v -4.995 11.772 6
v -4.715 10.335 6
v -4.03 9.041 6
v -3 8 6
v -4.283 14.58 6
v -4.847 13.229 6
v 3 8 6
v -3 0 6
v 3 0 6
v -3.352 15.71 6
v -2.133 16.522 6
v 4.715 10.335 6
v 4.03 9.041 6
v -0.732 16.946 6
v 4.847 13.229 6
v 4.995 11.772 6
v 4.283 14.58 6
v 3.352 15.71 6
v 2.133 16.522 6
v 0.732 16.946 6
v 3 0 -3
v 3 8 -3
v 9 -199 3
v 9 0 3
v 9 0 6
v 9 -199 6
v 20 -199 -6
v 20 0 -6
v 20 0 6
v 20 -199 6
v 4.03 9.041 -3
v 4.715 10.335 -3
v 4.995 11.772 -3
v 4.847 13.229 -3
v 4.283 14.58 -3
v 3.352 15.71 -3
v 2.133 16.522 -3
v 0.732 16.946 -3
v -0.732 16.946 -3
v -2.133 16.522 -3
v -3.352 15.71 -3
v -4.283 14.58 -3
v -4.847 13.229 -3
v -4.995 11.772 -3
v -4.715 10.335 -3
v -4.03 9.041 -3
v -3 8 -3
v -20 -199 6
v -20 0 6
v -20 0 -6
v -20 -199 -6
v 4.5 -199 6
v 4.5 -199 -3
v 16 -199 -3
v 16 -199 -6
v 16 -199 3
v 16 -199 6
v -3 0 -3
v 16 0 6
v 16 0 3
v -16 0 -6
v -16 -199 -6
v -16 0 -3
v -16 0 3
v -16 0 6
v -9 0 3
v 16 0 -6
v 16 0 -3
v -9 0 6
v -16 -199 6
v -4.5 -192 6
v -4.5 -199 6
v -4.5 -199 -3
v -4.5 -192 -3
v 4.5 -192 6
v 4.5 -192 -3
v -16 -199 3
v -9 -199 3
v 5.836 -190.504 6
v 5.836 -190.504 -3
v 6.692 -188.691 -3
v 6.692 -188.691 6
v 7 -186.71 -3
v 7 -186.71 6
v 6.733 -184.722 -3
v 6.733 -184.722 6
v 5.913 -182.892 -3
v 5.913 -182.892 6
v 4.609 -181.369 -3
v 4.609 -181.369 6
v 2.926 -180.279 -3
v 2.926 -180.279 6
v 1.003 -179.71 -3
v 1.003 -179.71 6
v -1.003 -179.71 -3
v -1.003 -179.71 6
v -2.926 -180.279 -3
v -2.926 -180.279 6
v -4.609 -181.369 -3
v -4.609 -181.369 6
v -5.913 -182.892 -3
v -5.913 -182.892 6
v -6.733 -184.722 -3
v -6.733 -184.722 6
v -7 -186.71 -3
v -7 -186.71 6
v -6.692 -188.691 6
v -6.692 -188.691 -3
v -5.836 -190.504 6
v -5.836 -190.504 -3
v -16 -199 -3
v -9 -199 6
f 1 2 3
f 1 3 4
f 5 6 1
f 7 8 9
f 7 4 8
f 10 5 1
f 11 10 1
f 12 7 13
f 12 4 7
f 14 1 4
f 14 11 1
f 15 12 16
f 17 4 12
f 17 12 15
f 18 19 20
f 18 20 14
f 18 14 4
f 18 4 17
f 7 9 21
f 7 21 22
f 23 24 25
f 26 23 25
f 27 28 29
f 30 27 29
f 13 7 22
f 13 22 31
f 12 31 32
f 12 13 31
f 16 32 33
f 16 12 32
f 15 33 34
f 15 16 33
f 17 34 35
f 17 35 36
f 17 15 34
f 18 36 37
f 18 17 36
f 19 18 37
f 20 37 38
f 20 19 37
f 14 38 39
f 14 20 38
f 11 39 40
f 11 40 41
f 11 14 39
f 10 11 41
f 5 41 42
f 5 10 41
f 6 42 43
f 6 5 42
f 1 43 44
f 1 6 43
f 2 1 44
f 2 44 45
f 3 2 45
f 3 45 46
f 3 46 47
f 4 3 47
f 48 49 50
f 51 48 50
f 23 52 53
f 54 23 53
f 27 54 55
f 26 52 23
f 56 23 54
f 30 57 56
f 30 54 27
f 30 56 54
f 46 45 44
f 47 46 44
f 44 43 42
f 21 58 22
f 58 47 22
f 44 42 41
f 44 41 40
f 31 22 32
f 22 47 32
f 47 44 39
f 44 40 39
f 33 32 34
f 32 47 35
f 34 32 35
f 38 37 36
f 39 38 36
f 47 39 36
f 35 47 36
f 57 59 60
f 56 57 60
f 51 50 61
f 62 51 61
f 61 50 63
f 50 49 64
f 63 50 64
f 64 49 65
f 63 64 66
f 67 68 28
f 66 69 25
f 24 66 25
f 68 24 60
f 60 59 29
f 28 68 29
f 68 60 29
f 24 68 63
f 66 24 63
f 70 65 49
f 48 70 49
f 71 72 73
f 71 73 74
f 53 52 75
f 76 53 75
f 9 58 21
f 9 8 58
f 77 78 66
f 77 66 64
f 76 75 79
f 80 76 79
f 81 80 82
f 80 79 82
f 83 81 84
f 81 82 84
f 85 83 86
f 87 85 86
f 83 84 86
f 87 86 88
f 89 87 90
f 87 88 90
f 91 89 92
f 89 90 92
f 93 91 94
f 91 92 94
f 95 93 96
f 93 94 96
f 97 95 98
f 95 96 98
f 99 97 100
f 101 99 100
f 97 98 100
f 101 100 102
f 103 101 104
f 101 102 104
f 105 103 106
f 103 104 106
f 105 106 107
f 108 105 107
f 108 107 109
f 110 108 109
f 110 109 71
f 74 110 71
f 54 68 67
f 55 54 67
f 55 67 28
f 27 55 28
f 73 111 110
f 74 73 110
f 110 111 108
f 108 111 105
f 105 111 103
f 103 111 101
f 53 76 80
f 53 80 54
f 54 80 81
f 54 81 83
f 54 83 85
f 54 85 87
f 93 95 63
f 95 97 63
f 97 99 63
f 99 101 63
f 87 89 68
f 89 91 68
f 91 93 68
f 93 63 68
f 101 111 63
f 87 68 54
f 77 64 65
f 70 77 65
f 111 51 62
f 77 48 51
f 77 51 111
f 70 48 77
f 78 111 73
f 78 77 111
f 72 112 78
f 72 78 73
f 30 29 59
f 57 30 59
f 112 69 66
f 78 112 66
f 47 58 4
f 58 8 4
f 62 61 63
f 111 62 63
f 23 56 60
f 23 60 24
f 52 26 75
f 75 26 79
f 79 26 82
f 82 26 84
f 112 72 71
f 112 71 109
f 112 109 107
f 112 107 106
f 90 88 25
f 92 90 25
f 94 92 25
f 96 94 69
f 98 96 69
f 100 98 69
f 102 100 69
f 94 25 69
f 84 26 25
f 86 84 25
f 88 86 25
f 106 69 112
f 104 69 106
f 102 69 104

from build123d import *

# Parameters (mm, degrees)
PAD_DEPTH         = 199
POCKET_DEPTH      = 12.001
PAD001_DEPTH      = 6
PAD001_DEPTH_BACK = 3


with BuildPart() as body:
    # Sketch → Pad (new body)
    with BuildSketch(Plane.XZ):
        Polygon((-20, 6), (-20, -6), (-16, -6), (-16, -3), (-9, -3), (9, -3), (16, -3), (16, -6), (20, -6), (20, 6), (16, 6), (16, 3), (9, 3), (9, 6), (-9, 6), (-9, 3), (-16, 3), (-16, 6), align=None)
    extrude(amount=PAD_DEPTH)

    # Sketch002 (on Face14 of Pad) → Pocket (cut, through all)
    with BuildSketch(Plane(origin=(0, 0, 6), x_dir=(-1, 0, 0), z_dir=(0, 0, 1))):
        with BuildLine():
            Line((-4.5, 199), (4.5, 199))
            Line((4.5, 199), (4.5, 192))
            ThreePointArc((-4.5, 192), (0, 179.638097), (4.5, 192))
            Line((-4.5, 199), (-4.5, 192))
        make_face()
    extrude(amount=-POCKET_DEPTH, mode=Mode.SUBTRACT)


with BuildPart() as body001:
    # Sketch001 → Pad001 (new body, two sides)
    with BuildSketch(Plane.XY) as pad001_sk:
        with BuildLine():
            Line((-3, 0), (3, 0))
            Line((3, 0), (3, 8))
            ThreePointArc((3, 8), (0, 17), (-3, 8))
            Line((-3, 0), (-3, 8))
        make_face()
    extrude(amount=PAD001_DEPTH)
    extrude(pad001_sk.sketch, amount=-PAD001_DEPTH_BACK)


solid = Compound([body.part, body001.part])
